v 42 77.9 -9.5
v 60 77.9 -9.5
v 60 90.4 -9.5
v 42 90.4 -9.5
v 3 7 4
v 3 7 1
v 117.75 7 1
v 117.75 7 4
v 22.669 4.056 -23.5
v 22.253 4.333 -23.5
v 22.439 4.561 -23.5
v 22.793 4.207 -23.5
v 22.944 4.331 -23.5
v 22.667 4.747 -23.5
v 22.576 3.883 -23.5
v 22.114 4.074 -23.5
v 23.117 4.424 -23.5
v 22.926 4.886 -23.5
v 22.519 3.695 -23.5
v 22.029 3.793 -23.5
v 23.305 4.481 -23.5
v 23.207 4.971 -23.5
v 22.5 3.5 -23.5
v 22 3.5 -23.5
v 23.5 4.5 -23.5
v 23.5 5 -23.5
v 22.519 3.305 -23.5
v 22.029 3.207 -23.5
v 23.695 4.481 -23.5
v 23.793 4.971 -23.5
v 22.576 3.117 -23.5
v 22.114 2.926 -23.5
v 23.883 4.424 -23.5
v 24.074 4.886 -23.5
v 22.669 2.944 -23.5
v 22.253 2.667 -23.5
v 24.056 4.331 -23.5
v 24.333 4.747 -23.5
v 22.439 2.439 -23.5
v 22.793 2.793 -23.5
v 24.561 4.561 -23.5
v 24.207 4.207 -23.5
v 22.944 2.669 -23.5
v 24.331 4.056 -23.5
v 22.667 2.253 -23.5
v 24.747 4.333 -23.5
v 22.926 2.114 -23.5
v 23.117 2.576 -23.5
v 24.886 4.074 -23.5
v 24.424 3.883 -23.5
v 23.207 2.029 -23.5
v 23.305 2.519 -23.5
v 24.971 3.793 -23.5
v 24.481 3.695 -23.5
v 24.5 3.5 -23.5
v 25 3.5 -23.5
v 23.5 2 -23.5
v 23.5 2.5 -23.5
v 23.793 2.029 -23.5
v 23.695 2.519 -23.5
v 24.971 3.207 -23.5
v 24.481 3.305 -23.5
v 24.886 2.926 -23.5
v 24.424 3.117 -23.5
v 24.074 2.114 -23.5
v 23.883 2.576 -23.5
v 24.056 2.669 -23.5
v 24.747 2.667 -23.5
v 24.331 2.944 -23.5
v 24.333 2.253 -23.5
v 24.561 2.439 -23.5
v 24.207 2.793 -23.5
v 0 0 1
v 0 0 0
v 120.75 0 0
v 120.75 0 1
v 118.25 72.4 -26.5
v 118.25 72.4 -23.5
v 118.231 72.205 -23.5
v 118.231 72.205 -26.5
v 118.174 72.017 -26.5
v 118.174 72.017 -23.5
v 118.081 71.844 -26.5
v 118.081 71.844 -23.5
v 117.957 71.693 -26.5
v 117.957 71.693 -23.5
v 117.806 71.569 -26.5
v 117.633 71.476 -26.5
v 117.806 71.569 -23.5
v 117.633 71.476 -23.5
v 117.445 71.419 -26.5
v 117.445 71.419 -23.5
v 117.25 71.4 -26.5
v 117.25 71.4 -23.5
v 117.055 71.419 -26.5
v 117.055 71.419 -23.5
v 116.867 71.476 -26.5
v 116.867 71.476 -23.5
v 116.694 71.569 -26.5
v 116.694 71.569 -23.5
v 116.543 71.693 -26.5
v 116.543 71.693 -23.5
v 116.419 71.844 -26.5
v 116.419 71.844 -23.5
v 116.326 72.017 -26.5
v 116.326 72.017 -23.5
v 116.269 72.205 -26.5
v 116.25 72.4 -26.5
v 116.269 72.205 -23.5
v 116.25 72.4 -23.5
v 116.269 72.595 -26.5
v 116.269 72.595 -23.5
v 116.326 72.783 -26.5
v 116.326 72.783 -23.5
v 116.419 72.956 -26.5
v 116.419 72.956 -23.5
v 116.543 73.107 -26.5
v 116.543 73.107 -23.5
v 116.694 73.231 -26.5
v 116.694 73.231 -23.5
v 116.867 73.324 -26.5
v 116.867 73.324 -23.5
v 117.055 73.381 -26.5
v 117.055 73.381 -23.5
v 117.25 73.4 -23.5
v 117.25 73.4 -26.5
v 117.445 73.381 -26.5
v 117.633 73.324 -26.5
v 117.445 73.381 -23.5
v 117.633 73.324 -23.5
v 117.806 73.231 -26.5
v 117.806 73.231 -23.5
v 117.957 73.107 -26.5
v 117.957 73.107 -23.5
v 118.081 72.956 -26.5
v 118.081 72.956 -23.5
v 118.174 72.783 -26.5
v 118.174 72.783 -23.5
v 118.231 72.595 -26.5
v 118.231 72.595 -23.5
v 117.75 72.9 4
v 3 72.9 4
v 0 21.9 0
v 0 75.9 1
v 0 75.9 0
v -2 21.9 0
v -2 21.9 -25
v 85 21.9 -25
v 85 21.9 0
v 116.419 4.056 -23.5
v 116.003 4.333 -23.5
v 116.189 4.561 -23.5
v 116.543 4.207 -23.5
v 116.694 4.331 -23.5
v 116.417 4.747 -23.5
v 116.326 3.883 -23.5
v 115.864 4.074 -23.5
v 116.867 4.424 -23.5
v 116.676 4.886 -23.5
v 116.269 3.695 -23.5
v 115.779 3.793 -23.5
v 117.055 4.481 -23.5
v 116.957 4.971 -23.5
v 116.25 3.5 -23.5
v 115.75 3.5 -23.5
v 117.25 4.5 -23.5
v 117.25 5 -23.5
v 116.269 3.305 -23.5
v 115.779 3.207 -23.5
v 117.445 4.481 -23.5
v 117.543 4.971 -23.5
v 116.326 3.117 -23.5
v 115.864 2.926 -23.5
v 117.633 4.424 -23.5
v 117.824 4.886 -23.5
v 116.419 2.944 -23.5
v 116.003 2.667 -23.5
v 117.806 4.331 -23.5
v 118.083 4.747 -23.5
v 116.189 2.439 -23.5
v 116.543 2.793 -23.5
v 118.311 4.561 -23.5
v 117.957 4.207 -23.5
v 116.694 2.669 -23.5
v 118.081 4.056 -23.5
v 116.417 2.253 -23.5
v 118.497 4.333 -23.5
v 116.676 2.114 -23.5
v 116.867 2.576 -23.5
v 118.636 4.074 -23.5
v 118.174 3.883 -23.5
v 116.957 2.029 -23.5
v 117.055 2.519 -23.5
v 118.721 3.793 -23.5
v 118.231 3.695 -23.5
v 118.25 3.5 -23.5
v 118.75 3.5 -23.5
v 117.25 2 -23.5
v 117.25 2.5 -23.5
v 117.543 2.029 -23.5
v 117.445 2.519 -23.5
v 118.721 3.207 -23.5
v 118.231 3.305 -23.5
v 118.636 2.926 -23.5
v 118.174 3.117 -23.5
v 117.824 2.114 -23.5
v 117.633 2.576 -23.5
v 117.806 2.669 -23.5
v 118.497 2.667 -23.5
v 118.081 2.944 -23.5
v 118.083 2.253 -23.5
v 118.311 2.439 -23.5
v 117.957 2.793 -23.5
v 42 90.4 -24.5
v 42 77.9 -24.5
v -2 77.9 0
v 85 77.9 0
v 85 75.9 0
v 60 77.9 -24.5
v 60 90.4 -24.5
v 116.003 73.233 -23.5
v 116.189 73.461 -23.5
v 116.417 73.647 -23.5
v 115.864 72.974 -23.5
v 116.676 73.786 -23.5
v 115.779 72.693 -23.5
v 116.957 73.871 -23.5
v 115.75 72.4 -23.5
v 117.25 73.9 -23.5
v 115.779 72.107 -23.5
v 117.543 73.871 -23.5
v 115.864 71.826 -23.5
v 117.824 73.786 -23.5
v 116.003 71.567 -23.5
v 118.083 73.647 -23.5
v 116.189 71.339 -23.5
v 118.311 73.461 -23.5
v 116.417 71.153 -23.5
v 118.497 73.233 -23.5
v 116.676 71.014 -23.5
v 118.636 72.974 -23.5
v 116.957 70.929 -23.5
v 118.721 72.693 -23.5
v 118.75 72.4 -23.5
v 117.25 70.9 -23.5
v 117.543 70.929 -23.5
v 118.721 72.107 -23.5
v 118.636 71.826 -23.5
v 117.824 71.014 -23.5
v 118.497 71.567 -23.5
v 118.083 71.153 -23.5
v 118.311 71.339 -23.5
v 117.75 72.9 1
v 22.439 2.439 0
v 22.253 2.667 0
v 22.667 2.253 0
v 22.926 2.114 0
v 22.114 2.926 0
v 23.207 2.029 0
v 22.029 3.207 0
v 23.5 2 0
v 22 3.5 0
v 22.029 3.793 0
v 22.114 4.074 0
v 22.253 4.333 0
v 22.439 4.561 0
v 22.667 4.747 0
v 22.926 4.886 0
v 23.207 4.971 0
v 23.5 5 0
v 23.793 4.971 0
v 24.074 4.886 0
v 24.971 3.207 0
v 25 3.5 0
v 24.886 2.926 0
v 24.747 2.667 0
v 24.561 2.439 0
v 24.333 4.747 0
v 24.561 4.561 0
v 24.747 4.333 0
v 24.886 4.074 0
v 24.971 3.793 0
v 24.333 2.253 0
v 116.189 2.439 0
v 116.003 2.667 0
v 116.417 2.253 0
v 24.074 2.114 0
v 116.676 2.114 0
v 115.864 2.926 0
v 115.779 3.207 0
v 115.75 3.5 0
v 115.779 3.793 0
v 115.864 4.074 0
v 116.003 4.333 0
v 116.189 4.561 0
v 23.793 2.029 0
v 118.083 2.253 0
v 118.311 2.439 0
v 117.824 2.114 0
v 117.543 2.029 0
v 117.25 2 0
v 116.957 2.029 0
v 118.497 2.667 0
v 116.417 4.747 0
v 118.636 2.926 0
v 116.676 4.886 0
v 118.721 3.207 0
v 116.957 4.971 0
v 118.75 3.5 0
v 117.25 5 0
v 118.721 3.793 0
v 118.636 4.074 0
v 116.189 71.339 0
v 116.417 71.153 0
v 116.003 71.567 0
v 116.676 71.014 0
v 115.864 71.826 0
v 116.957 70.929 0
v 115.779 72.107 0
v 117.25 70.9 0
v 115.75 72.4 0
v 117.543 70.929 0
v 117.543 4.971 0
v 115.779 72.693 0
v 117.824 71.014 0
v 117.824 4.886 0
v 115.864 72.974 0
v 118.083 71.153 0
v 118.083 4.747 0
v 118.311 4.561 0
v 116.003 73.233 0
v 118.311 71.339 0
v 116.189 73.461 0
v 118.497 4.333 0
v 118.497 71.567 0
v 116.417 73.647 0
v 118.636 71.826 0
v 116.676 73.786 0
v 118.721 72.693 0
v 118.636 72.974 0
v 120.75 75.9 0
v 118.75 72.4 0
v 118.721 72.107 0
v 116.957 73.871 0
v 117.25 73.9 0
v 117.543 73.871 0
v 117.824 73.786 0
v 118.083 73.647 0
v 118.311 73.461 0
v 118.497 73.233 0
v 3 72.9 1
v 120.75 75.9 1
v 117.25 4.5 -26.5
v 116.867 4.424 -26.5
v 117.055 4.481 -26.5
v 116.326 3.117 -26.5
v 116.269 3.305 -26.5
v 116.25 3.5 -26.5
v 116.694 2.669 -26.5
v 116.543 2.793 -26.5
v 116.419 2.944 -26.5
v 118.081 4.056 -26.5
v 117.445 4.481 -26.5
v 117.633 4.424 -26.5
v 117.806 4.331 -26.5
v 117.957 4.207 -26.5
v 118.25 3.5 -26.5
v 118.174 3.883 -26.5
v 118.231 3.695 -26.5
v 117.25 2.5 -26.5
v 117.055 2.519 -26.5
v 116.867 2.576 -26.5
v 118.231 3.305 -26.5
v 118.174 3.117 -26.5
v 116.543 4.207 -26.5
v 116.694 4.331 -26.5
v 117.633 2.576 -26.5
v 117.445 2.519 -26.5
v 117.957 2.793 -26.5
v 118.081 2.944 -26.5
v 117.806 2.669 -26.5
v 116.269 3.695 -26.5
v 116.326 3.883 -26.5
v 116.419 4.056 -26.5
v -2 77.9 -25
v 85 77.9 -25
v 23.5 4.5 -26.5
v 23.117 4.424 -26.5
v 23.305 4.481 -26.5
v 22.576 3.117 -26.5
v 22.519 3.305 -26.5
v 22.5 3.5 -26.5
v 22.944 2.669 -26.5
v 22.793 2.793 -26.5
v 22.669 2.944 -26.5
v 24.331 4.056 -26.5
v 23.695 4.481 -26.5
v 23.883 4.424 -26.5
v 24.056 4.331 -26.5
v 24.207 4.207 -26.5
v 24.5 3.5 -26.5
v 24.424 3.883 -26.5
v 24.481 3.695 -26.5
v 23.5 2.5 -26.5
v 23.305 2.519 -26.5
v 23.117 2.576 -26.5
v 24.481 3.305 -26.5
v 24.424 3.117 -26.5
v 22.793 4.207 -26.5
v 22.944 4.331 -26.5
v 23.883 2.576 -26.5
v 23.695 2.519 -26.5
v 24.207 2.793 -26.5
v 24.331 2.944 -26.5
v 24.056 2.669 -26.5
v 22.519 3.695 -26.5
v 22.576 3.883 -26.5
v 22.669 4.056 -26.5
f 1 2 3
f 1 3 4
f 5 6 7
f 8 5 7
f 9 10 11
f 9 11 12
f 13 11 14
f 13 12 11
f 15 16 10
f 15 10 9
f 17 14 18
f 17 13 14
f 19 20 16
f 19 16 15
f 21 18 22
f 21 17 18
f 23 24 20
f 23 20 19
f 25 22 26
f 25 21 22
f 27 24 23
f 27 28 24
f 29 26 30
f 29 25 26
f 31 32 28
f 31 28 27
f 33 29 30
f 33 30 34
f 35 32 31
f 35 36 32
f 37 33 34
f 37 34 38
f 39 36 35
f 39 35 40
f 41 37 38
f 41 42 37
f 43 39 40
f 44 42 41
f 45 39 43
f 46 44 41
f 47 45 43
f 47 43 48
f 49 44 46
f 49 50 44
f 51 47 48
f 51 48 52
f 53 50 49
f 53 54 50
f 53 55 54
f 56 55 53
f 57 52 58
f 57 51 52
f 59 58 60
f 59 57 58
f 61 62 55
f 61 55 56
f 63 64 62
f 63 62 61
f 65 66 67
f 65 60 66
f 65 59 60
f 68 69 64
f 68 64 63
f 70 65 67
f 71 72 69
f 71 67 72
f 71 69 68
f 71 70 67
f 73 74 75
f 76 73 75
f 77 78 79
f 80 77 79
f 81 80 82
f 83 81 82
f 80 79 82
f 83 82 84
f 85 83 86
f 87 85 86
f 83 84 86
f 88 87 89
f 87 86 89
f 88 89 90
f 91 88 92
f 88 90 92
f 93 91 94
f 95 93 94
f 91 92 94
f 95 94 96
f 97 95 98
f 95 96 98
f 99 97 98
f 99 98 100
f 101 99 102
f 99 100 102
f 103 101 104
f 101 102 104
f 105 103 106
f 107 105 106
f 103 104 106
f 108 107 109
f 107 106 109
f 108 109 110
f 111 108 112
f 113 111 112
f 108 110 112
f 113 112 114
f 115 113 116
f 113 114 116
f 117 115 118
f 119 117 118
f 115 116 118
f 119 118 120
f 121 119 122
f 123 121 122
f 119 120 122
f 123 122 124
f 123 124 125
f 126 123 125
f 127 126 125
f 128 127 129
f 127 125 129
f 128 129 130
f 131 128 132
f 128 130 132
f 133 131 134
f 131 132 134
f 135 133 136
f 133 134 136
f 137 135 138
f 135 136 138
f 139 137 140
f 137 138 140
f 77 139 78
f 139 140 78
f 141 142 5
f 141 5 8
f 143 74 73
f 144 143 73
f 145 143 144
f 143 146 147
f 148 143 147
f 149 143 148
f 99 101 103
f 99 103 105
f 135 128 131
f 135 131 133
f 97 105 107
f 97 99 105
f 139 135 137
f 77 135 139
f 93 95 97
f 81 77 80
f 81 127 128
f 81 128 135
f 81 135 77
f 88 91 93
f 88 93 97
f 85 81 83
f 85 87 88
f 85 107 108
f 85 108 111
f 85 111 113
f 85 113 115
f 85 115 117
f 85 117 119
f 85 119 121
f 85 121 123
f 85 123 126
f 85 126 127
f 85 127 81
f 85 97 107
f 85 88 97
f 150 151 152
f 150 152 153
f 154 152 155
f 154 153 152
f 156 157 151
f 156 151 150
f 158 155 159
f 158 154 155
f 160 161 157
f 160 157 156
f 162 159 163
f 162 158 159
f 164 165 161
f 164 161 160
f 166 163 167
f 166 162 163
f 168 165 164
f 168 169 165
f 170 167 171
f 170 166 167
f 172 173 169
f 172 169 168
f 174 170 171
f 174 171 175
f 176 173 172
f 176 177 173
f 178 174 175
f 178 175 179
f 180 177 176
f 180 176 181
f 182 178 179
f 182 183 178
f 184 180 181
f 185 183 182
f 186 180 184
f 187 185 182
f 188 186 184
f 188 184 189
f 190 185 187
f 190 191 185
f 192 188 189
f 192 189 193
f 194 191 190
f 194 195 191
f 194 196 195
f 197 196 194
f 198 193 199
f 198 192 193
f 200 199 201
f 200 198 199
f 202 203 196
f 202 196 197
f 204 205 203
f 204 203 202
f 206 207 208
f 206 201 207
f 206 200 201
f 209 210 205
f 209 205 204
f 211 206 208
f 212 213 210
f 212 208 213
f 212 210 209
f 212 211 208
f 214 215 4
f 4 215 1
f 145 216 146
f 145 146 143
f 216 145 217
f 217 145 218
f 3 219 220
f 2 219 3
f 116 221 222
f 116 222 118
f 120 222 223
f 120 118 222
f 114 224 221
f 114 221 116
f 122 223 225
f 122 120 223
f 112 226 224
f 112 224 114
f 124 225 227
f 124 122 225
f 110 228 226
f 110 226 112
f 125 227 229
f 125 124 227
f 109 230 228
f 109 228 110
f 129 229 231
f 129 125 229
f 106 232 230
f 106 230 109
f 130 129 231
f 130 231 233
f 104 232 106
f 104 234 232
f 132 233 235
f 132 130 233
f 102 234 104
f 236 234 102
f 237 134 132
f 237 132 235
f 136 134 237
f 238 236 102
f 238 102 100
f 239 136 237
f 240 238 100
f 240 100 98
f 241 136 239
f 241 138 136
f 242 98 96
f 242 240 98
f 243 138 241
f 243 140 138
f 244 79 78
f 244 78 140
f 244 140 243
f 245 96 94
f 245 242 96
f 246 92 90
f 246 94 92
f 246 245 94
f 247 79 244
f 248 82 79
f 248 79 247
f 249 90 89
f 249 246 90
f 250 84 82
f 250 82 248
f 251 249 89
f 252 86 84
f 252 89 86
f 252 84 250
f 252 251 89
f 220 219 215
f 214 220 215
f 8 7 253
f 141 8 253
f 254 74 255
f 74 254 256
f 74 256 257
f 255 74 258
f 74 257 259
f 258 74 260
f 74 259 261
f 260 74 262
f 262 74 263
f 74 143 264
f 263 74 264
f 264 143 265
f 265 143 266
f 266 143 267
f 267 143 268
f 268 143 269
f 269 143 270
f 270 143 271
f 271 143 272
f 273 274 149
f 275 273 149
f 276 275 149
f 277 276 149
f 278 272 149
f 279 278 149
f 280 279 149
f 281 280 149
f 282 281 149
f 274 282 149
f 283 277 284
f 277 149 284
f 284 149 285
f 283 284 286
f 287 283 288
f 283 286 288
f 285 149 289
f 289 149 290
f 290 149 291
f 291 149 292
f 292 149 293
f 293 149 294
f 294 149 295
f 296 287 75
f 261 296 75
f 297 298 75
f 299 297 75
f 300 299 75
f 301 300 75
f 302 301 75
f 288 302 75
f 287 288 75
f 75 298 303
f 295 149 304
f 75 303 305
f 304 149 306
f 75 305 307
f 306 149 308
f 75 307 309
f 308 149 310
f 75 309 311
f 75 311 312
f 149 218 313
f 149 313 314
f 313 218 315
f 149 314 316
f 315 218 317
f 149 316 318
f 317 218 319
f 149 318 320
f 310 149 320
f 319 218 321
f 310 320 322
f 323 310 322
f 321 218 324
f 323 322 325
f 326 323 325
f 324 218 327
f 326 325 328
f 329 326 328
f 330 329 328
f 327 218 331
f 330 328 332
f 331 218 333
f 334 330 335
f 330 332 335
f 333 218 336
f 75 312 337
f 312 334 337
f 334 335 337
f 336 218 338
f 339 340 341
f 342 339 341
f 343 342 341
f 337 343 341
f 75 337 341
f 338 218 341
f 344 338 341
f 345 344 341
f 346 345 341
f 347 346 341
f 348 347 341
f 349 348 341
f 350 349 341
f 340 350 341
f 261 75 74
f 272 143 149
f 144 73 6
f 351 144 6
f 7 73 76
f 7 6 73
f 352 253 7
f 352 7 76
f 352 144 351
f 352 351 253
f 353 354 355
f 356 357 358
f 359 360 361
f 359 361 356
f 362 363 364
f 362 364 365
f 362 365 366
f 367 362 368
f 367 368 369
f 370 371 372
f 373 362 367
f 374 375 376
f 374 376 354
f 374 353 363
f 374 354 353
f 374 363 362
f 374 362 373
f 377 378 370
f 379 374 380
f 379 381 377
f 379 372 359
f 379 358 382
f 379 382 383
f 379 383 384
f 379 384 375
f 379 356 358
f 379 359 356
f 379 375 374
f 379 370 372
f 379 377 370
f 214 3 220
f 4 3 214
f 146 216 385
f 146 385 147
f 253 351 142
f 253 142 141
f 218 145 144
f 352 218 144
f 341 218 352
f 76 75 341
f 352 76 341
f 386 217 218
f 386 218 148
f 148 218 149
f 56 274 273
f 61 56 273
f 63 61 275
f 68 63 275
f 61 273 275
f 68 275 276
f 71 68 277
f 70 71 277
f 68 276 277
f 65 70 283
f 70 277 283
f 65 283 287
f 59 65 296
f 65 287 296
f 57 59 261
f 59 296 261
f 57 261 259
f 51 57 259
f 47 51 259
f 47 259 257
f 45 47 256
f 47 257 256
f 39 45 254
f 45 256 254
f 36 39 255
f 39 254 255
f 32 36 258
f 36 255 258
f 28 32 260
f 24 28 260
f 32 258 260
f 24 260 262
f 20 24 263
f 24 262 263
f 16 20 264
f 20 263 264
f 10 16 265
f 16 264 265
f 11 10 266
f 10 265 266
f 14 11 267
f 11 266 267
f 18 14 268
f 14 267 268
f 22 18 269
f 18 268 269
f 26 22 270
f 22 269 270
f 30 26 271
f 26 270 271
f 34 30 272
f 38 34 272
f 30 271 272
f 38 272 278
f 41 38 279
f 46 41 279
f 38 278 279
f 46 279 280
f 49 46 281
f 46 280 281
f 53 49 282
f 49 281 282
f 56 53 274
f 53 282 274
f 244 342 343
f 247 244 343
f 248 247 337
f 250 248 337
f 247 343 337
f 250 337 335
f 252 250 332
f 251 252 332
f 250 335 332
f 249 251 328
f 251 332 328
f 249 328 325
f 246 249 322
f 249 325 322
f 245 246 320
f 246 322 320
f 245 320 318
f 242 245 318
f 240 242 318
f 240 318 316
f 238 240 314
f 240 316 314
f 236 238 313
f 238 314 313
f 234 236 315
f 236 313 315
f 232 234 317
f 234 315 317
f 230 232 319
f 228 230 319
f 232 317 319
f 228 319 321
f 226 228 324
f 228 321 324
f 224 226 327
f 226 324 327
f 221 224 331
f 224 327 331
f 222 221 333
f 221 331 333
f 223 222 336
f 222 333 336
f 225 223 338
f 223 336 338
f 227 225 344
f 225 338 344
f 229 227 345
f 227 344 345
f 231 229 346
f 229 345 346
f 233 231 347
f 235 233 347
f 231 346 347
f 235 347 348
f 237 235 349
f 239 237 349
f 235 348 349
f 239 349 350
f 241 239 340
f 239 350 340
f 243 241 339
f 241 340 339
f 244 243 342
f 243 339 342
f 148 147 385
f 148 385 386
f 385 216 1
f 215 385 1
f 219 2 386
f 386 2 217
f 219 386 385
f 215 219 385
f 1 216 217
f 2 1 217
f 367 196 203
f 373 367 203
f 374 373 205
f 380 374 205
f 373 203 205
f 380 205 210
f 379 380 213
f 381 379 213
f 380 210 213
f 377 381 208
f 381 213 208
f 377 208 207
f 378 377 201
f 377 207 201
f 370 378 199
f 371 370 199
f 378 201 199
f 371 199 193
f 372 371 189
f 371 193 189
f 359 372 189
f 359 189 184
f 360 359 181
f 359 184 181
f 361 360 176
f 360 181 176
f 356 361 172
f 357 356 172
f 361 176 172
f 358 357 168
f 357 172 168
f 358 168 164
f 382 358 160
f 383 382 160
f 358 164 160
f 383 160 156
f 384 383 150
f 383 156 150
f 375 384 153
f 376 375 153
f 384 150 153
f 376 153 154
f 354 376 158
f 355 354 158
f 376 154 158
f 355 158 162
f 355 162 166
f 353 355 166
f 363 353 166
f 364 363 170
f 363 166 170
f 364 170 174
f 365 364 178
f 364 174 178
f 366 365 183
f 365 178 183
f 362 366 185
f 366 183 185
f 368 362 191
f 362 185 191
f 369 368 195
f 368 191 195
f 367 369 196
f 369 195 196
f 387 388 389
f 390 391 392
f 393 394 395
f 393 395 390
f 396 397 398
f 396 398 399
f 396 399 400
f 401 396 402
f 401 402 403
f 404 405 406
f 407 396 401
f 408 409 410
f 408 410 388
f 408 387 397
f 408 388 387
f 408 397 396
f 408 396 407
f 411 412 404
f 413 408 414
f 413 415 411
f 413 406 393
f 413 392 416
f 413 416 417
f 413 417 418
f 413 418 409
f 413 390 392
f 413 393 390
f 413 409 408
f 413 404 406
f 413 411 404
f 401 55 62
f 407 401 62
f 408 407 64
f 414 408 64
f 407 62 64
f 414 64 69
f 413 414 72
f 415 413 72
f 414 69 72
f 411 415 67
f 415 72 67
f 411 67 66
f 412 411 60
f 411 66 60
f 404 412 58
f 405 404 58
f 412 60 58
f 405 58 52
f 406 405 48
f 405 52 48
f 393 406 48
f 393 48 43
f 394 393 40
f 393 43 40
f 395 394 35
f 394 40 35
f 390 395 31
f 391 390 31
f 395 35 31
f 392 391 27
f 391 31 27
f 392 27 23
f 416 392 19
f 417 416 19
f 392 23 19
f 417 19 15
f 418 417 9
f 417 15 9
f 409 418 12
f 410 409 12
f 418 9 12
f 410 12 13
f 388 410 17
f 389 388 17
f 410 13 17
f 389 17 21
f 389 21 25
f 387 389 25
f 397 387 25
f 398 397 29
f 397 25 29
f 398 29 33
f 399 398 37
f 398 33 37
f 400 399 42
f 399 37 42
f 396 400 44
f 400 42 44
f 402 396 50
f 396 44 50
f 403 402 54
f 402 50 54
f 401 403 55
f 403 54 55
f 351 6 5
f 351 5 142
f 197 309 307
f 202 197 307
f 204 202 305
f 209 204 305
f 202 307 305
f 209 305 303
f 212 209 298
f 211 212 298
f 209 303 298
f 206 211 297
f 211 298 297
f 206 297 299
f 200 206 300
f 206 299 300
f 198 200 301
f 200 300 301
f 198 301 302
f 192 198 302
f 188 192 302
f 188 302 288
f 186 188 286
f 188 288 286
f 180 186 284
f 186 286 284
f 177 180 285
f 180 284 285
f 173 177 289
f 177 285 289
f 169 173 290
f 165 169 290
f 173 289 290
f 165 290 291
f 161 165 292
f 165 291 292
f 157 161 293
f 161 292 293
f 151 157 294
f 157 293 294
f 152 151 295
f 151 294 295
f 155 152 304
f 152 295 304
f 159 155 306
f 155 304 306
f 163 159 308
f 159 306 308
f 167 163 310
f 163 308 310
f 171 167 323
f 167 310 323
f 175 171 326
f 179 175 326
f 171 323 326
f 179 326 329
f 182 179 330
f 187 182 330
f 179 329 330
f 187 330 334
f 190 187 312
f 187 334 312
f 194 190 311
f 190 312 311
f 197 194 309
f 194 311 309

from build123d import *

# Parameters (mm, degrees)
F0_W      = 120.75
F0_H      = 75.9
F1_DEPTH  = 1
F2_W      = 114.75
F2_H      = 65.9
F3_DEPTH  = 3
F4_W      = 87
F4_H      = 56
F5_DEPTH  = 25
F6_W      = 18
F6_H      = 15
F7_DEPTH  = 12.5
F8_R      = 1.5
F9_DEPTH  = 23.5
F10_R     = 1
F11_DEPTH = 3


with BuildPart() as f1:
    # F0 (on Top) → F1 (new body)
    with BuildSketch(Plane.XY):
        with Locations((60.375, 37.95)):
            Rectangle(F0_W, F0_H)
    extrude(amount=F1_DEPTH)

    # F2 (on face) → F3 (join)
    with BuildSketch(Plane.XY.offset(1)):
        with Locations((60.375, 39.95)):
            Rectangle(F2_W, F2_H)
    extrude(amount=F3_DEPTH)

    # F4 (on face) → F5 (join)
    with BuildSketch(Plane(origin=(0, 0, 0), x_dir=(1, 0, 0), z_dir=(0, 0, -1))):
        with Locations((41.5, -49.9)):
            Rectangle(F4_W, F4_H)
    extrude(amount=F5_DEPTH)

    # F6 (on face) → F7 (join)
    with BuildSketch(Plane(origin=(0, 77.9, 0), x_dir=(-1, 0, 0), z_dir=(0, 1, 0))):
        with Locations((-51, -17)):
            Rectangle(F6_W, F6_H)
    extrude(amount=F7_DEPTH)

    # F8 (on face) → F9 (join)
    with BuildSketch(Plane(origin=(0, 0, 0), x_dir=(1, 0, 0), z_dir=(0, 0, -1))):
        with Locations((23.5, -3.5)):
            Circle(F8_R)
        with Locations((117.25, -3.5)):
            Circle(F8_R)
        with Locations((117.25, -72.4)):
            Circle(F8_R)
    extrude(amount=F9_DEPTH)

    # F10 (on face) → F11 (join)
    with BuildSketch(Plane(origin=(0, 0, -23.5), x_dir=(1, 0, 0), z_dir=(0, 0, -1))):
        with Locations((23.5, -3.5)):
            Circle(F10_R)
        with Locations((117.25, -3.5)):
            Circle(F10_R)
        with Locations((117.25, -72.4)):
            Circle(F10_R)
    extrude(amount=F11_DEPTH)


solid = f1.part
